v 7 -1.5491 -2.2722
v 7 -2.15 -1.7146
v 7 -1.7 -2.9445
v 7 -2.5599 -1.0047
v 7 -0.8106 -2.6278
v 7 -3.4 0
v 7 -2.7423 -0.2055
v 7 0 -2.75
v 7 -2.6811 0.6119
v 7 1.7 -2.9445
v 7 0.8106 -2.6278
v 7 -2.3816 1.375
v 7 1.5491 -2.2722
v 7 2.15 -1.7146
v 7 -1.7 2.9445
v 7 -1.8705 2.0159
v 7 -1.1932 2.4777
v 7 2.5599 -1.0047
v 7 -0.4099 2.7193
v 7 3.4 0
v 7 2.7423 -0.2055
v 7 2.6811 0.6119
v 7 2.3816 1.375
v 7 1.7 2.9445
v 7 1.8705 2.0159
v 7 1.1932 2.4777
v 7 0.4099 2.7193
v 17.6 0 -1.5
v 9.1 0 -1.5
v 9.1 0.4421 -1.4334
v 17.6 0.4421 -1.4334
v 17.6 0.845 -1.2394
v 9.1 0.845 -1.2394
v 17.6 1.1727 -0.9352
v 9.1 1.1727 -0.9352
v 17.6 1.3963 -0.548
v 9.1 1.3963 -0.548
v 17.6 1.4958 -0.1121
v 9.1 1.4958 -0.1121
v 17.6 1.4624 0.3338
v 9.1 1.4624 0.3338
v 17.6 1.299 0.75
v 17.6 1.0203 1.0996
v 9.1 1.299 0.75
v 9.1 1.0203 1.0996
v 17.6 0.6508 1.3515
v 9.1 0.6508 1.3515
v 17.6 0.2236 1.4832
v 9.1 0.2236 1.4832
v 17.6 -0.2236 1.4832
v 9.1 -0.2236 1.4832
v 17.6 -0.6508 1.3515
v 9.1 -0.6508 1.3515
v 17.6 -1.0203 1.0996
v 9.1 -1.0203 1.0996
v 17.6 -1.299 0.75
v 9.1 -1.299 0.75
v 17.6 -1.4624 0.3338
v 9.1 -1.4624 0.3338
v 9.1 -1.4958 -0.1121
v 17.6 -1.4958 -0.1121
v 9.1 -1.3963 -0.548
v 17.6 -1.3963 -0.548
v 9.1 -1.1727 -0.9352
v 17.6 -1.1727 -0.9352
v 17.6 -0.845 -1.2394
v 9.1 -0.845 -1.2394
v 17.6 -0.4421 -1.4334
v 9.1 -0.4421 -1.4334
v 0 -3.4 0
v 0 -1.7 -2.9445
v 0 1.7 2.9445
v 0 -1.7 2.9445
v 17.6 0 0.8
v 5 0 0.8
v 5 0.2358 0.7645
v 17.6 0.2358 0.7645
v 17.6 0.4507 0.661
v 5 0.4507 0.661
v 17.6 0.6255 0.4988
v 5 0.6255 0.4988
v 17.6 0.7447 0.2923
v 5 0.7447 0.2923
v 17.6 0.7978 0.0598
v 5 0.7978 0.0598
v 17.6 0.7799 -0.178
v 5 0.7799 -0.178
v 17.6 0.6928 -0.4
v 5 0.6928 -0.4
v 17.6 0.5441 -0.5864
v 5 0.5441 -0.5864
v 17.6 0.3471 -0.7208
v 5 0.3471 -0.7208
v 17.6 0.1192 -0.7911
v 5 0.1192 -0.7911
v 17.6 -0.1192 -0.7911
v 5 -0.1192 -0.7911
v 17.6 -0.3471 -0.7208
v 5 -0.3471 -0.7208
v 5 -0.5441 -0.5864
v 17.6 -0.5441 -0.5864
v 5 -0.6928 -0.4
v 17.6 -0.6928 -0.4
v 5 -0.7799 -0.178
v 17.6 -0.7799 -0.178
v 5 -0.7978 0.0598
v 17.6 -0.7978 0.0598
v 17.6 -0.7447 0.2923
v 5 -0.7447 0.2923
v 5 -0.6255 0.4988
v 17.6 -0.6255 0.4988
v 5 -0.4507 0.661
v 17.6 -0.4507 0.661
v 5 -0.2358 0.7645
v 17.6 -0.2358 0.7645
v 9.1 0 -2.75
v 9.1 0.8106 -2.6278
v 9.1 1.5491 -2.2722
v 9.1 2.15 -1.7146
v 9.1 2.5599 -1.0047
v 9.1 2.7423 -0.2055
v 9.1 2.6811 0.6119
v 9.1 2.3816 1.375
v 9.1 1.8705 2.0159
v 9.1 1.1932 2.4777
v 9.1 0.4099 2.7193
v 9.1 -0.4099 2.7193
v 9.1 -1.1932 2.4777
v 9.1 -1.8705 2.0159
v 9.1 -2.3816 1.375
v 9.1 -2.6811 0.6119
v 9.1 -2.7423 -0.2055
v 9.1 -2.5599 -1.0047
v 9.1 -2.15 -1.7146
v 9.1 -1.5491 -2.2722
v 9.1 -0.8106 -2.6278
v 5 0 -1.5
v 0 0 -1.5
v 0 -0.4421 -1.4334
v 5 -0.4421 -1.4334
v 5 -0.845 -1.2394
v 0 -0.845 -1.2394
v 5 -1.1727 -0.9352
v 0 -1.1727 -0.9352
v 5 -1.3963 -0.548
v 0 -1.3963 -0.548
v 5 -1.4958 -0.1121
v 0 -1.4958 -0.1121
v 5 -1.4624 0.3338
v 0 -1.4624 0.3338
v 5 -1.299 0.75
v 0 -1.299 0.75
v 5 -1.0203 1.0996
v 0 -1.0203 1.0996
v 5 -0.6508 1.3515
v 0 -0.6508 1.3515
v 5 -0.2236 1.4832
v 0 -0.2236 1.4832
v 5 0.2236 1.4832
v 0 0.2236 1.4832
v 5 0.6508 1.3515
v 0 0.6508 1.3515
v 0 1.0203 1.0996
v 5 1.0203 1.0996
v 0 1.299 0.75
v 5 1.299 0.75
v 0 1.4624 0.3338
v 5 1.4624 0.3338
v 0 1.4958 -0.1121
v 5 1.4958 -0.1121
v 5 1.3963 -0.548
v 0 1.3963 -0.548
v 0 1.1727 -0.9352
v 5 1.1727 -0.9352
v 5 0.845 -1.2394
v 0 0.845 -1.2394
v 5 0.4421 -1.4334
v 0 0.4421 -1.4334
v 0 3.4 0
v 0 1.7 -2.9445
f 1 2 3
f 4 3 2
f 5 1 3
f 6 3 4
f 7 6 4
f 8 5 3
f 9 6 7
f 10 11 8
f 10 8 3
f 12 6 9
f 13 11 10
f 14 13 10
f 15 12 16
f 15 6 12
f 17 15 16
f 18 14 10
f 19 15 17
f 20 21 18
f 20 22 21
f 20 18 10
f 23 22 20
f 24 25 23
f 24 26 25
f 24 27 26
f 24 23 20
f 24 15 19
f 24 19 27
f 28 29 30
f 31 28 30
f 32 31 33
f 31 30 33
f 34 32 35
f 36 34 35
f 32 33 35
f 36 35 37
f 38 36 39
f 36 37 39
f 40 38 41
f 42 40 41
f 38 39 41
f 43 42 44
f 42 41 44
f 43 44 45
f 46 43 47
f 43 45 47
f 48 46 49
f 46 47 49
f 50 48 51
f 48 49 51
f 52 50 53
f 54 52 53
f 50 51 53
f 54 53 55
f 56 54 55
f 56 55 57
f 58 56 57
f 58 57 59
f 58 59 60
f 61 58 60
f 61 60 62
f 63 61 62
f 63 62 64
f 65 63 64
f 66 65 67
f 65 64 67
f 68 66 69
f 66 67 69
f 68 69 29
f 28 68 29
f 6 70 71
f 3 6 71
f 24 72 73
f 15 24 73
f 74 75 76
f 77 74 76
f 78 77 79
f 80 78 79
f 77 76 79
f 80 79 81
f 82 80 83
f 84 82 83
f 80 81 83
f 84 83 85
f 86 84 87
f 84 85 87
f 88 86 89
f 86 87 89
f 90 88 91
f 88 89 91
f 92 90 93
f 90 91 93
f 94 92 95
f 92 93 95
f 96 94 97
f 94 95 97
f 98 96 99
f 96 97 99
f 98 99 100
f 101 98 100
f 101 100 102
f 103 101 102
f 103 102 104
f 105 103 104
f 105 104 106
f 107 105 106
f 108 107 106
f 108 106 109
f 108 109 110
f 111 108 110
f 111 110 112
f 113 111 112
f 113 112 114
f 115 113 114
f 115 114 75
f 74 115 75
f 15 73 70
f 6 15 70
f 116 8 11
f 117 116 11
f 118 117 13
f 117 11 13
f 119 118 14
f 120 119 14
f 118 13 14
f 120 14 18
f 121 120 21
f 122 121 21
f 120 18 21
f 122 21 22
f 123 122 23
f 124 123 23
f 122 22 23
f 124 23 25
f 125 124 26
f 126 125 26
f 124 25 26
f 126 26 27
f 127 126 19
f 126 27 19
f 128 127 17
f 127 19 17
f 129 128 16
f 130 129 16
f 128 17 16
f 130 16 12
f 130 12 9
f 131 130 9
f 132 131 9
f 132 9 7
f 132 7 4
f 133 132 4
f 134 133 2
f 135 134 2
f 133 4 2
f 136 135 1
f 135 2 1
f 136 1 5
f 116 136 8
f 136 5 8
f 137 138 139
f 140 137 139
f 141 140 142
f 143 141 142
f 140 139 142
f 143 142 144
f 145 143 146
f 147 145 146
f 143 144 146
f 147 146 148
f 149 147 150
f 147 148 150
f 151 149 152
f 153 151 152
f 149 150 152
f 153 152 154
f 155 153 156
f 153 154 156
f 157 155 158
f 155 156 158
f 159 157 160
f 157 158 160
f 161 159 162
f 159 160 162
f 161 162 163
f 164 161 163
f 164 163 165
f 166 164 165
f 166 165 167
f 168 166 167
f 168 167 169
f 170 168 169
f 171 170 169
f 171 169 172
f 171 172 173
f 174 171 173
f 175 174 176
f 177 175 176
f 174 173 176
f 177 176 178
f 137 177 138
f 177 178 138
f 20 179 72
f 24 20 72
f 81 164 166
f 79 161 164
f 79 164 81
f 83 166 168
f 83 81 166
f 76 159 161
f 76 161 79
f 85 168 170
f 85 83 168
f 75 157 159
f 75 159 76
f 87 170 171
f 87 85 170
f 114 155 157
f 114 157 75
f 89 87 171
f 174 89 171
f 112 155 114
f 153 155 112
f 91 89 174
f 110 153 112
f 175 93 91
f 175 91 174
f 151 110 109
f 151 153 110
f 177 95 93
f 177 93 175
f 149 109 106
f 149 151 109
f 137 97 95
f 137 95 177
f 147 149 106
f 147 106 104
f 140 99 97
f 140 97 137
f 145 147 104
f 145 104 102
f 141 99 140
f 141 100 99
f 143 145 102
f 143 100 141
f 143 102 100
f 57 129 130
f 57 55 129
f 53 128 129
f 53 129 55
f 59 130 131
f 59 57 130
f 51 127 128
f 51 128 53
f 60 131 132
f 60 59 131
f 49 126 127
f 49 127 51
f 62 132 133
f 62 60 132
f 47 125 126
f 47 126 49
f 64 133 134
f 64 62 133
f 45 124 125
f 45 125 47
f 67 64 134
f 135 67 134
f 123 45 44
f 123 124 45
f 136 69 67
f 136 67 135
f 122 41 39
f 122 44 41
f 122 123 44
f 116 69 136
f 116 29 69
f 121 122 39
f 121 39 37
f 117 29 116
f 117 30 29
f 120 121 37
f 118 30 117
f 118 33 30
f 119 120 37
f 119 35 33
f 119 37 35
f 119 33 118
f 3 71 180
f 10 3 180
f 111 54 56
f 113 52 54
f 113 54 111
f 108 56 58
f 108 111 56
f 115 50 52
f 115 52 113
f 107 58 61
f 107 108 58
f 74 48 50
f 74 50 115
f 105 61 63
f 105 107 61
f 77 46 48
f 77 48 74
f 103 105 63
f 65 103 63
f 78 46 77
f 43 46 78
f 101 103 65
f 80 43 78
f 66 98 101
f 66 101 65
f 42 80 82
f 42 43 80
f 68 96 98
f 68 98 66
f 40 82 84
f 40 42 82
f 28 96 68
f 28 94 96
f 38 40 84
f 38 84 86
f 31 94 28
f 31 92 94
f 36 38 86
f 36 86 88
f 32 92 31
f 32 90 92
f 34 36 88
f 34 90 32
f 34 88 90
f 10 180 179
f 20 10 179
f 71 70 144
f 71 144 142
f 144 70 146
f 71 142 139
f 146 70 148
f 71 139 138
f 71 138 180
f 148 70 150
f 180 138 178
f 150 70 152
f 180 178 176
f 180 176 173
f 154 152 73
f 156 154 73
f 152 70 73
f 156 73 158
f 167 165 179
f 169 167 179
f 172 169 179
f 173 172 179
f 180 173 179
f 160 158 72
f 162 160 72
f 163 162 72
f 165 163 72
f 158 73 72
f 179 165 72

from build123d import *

# Parameters (mm, degrees)
BOSS_EXTRUDE1_DEPTH = 7
SKETCH2_R           = 2.75
BOSS_EXTRUDE2_DEPTH = 2.1
SKETCH3_R           = 1.5
BOSS_EXTRUDE3_DEPTH = 8.5
SKETCH4_R           = 1.5
CUT_EXTRUDE1_DEPTH  = 5
SKETCH5_R           = 0.8
CUT_EXTRUDE2_DEPTH  = 14.378714437


with BuildPart() as part:
    # Sketch1 → Boss-Extrude1 (new body)
    with BuildSketch(Plane.YZ):
        Polygon((3.4, 0), (1.7, 2.944486373), (-1.7, 2.944486373), (-3.4, 0), (-1.7, -2.944486373), (1.7, -2.944486373), align=None)
    extrude(amount=BOSS_EXTRUDE1_DEPTH)

    # Sketch2 → Boss-Extrude2 (add)
    with BuildSketch(Plane.YZ.offset(7)):
        with Locations(Location((0, 0, 0), (0, 0, 270))):
            Circle(SKETCH2_R)
    extrude(amount=BOSS_EXTRUDE2_DEPTH)

    # Sketch3 → Boss-Extrude3 (add)
    with BuildSketch(Plane.YZ.offset(9.1)):
        with Locations(Location((0, 0, 0), (0, 0, 270))):
            Circle(SKETCH3_R)
    extrude(amount=BOSS_EXTRUDE3_DEPTH)

    # Sketch4 → Cut-Extrude1 (cut)
    with BuildSketch(Plane(origin=(0, 0, 0), x_dir=(0, -1, 0), z_dir=(-1, 0, 0))):
        with Locations(Location((0, 0, 0), (0, 0, 270))):
            Circle(SKETCH4_R)
    extrude(amount=-CUT_EXTRUDE1_DEPTH, mode=Mode.SUBTRACT)

    # Sketch5 → Cut-Extrude2 (cut, through all)
    with BuildSketch(Plane(origin=(5, 0, 0), x_dir=(0, -1, 0), z_dir=(-1, 0, 0))):
        with Locations(Location((0, 0, 0), (0, 0, 90))):
            Circle(SKETCH5_R)
    extrude(amount=-CUT_EXTRUDE2_DEPTH, mode=Mode.SUBTRACT)


solid = part.part
